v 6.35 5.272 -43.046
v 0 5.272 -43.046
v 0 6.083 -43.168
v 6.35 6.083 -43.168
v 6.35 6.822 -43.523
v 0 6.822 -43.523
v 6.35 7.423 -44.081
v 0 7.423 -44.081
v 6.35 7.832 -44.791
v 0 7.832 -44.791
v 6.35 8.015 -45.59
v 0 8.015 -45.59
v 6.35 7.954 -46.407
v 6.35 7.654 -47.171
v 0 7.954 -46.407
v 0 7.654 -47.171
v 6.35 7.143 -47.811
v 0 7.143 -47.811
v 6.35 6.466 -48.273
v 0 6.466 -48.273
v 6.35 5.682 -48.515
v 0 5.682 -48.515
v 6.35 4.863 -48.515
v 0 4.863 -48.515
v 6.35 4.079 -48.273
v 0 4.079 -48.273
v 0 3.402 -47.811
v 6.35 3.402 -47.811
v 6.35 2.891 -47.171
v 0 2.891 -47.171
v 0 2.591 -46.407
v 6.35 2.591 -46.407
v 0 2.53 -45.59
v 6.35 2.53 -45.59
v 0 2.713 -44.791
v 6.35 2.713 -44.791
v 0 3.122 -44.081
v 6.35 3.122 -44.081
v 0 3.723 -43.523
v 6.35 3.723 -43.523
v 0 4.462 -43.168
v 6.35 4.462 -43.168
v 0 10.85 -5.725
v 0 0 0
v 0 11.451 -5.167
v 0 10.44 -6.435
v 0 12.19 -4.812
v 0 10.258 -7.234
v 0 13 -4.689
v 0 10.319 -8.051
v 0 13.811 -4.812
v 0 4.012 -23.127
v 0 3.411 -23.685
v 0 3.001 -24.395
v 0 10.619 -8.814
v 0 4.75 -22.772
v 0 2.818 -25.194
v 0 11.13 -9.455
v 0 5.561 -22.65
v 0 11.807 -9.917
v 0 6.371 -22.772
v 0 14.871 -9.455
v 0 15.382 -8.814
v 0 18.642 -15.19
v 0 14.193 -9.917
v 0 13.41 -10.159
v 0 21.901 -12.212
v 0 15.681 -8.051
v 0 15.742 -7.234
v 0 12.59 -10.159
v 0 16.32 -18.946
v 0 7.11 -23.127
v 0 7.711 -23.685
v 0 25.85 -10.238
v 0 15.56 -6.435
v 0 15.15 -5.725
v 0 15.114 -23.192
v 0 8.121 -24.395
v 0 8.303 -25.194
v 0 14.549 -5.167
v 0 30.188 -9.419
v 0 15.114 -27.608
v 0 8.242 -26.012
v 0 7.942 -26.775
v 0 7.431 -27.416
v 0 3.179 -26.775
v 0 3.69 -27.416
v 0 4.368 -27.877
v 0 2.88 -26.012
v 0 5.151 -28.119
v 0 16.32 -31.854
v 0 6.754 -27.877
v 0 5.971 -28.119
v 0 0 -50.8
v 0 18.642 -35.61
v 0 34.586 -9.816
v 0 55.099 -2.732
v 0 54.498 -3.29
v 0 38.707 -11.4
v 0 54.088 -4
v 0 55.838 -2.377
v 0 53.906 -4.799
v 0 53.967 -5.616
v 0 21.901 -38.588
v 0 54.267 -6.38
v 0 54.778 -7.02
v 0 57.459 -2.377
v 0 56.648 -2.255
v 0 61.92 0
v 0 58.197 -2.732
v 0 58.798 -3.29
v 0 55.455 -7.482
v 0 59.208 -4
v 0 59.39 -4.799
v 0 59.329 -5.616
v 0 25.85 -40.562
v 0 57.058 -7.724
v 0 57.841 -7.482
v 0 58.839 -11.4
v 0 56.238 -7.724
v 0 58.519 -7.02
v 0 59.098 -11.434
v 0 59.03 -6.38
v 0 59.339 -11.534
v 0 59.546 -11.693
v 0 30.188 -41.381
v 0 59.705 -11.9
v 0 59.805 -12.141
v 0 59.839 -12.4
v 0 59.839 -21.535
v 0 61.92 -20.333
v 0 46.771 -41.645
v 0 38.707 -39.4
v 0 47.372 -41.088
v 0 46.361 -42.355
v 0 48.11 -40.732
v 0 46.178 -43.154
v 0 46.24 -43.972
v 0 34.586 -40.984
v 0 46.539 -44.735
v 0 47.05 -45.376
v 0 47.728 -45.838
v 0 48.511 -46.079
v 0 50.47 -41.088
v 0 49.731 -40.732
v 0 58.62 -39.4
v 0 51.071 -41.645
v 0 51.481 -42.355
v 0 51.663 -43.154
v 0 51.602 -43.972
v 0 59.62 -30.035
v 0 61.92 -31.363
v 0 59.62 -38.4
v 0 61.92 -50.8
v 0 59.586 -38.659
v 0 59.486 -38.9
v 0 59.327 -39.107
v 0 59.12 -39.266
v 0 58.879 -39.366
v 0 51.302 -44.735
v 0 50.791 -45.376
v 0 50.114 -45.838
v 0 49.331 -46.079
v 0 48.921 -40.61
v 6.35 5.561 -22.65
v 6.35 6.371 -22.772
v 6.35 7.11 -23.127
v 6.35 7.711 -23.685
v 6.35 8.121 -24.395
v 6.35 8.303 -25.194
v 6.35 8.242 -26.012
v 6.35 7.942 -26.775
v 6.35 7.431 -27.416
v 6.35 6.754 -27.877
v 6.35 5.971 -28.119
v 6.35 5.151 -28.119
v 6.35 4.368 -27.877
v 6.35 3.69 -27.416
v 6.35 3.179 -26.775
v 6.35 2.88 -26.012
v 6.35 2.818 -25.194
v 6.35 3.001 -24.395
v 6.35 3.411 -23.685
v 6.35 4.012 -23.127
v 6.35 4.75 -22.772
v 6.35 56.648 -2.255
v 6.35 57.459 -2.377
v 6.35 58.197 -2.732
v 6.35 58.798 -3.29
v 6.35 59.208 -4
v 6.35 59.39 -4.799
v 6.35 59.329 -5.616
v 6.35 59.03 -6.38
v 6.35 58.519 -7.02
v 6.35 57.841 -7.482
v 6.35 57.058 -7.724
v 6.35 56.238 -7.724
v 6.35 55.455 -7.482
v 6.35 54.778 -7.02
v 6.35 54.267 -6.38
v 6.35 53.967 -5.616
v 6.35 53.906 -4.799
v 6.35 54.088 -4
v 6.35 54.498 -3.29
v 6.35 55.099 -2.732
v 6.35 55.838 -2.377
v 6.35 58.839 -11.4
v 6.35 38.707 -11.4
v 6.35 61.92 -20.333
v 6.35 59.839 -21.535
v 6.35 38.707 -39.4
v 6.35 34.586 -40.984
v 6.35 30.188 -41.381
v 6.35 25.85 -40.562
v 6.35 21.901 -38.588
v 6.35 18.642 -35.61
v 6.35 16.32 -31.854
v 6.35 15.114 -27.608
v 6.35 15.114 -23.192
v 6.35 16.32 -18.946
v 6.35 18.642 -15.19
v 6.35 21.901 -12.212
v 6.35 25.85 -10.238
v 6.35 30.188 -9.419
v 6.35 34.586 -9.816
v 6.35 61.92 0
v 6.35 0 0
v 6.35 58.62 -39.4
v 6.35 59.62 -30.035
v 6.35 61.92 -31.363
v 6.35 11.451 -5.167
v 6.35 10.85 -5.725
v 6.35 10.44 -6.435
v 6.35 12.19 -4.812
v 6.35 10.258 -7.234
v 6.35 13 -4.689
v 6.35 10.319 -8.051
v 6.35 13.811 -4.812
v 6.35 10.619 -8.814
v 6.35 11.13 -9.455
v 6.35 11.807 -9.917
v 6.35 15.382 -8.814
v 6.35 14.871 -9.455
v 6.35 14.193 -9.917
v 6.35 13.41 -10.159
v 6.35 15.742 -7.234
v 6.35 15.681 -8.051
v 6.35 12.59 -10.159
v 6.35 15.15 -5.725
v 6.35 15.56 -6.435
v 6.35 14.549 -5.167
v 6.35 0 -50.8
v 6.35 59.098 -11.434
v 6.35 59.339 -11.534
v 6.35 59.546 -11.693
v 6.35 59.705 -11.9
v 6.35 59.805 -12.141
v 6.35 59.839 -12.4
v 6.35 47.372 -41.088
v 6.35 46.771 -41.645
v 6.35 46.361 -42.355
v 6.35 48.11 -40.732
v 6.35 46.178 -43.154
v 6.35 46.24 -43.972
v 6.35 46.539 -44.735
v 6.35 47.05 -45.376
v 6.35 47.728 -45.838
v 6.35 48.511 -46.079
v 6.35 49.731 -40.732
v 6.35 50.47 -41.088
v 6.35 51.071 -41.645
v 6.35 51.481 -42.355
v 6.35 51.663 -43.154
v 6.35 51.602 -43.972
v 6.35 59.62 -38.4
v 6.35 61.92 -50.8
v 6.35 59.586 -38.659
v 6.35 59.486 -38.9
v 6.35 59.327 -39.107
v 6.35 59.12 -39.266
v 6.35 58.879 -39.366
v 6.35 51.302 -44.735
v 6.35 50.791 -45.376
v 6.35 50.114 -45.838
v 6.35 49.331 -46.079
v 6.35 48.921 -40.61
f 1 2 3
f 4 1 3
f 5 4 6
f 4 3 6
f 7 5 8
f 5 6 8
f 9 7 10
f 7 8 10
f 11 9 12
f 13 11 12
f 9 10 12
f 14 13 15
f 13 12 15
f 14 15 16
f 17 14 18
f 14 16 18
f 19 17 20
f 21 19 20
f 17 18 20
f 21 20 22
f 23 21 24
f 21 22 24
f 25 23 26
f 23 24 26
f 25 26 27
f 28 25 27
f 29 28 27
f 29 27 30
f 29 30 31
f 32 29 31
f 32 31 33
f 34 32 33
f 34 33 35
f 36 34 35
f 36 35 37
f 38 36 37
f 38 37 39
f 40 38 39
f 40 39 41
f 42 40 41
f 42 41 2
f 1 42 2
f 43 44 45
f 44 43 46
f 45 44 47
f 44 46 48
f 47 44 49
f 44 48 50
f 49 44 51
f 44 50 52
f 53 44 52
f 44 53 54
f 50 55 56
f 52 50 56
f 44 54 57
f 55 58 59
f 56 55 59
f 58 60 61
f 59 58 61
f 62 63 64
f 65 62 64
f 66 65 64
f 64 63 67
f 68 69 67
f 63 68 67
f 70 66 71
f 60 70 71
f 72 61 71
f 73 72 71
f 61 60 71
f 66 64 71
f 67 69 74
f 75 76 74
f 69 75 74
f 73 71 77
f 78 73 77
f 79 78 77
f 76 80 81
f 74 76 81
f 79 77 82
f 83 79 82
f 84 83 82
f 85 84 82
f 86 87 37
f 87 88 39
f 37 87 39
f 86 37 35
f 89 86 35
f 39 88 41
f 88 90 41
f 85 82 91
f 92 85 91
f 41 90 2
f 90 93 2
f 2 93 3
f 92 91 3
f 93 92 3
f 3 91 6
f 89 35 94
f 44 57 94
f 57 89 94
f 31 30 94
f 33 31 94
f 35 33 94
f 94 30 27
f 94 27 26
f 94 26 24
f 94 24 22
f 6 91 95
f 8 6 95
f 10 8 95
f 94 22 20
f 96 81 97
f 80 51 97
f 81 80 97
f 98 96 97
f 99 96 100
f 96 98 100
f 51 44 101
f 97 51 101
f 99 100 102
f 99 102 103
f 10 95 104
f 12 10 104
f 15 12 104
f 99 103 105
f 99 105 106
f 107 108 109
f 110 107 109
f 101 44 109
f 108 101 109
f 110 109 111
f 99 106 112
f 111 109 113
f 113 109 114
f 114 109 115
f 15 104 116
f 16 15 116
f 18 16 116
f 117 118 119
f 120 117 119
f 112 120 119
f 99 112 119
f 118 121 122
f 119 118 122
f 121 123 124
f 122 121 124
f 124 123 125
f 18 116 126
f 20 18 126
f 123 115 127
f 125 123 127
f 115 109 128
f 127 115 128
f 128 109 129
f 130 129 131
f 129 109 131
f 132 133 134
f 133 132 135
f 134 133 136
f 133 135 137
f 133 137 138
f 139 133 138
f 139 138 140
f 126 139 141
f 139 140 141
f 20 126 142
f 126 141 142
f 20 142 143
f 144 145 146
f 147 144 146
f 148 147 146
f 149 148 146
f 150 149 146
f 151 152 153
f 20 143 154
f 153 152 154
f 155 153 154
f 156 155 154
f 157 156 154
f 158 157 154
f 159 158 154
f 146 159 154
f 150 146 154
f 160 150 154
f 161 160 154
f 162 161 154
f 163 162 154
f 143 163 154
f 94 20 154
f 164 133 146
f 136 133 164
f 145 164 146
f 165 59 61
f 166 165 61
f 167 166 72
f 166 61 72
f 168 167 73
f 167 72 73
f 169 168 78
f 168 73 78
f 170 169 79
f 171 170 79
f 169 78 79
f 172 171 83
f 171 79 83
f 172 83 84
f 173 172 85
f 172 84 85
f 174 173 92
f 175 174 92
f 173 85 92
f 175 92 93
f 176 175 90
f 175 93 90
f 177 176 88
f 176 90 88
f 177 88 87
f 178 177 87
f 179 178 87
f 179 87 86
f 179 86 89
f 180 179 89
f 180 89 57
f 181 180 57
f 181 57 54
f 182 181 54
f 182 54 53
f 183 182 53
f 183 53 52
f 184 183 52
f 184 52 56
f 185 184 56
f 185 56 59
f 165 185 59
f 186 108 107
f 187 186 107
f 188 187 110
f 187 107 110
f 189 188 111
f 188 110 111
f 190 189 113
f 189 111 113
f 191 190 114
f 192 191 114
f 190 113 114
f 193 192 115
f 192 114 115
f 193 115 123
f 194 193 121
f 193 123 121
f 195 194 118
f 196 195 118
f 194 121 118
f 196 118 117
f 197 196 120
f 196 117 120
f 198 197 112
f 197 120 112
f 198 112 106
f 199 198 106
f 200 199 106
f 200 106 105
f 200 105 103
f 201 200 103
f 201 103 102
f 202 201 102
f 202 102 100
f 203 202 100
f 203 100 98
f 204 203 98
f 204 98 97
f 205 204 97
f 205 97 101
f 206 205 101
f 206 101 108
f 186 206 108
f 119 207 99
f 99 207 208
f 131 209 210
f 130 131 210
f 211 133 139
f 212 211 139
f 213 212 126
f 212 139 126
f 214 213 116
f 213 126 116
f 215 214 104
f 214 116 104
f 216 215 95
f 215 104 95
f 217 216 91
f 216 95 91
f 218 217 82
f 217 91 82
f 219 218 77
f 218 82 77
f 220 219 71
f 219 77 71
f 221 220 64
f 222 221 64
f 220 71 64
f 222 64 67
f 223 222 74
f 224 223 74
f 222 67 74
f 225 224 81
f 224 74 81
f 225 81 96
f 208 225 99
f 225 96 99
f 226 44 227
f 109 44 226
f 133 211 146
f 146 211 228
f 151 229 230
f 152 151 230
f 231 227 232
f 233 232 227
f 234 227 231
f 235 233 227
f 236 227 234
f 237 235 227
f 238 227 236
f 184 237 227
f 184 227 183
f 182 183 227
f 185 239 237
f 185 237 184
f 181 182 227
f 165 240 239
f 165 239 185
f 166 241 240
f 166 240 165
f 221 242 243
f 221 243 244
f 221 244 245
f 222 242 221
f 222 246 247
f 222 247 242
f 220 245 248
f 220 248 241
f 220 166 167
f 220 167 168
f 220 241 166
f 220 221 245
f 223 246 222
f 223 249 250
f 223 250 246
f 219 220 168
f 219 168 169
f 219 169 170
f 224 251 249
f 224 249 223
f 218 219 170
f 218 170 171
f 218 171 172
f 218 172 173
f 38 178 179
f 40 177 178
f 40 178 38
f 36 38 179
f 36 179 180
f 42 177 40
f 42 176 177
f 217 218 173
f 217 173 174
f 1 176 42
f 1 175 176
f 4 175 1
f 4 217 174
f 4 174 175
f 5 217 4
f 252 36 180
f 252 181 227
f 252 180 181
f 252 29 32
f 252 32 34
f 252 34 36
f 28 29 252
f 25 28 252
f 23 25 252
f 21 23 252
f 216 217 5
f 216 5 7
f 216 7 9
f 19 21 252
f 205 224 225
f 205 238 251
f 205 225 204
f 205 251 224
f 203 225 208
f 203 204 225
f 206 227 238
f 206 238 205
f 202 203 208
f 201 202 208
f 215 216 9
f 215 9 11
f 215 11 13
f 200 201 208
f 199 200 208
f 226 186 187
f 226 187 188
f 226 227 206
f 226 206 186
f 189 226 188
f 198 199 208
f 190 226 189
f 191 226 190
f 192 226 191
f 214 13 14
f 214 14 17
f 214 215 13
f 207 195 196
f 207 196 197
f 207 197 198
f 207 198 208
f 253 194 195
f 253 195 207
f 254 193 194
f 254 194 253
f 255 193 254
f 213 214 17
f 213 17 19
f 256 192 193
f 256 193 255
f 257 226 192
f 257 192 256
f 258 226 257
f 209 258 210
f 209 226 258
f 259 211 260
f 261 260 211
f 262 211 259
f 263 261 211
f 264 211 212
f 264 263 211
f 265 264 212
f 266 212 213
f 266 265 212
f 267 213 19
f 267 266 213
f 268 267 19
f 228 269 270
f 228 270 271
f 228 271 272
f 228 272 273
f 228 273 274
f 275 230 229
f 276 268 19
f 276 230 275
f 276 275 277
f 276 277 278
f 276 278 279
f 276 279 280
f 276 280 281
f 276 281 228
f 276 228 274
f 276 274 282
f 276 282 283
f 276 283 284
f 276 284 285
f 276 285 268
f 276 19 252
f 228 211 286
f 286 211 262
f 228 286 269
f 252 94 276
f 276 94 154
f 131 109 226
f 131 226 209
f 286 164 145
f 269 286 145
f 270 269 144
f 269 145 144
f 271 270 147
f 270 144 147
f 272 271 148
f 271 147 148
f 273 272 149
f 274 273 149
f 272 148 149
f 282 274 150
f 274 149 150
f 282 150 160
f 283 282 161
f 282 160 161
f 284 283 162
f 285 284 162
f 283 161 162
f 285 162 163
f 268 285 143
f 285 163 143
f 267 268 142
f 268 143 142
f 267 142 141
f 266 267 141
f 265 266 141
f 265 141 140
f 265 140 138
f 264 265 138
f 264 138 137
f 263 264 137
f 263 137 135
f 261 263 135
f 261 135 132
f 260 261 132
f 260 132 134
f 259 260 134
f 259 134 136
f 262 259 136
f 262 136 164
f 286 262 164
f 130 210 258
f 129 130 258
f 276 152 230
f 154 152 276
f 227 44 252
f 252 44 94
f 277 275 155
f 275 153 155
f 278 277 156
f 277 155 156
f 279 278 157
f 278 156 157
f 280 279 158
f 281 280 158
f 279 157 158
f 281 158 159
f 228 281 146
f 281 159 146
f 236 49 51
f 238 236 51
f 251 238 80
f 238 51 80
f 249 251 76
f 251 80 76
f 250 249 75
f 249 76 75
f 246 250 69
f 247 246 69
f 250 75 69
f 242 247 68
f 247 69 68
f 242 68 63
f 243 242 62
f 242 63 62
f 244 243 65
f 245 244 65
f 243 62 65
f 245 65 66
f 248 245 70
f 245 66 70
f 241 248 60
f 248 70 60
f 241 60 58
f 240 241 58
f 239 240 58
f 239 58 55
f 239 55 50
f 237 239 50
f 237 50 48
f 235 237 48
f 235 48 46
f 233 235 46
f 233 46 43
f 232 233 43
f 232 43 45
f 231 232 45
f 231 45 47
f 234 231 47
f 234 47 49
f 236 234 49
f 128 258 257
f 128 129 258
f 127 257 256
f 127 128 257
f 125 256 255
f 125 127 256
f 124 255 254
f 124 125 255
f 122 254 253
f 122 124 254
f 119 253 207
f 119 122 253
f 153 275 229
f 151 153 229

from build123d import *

# Parameters (mm, degrees)
SKETCH1_W           = 50.8
SKETCH1_H           = 61.92
BOSS_EXTRUDE2_DEPTH = 6.35
SKETCH2_R           = 16
CUT_EXTRUDE1_DEPTH  = 7.35
CUT_EXTRUDE4_DEPTH  = 7.35
CUT_EXTRUDE5_REACH  = 8.35
SKETCH5_R           = 2.75
FILLET1_R           = 1


with BuildPart() as part:
    # Sketch1 → Boss-Extrude2 (new body)
    with BuildSketch(Plane(origin=(0, 0, 0), x_dir=(0, 0, -1), z_dir=(1, 0, 0))):
        with Locations((25.4, 30.96)):
            Rectangle(SKETCH1_W, SKETCH1_H)
    extrude(amount=BOSS_EXTRUDE2_DEPTH)

    # Sketch2 → Cut-Extrude1 (cut, through all)
    with BuildSketch(Plane.ZY):
        with Locations((-25.4, 30.960695)):
            Circle(SKETCH2_R)
    extrude(amount=-CUT_EXTRUDE1_DEPTH, mode=Mode.SUBTRACT)

    # Sketch4 → Cut-Extrude4 (cut, through all)
    with BuildSketch(Plane(origin=(6.35, 0, 0), x_dir=(0, 0, -1), z_dir=(1, 0, 0))):
        Polygon((11.4, 59.839253392), (11.4, 37.92), (39.4, 37.92), (39.4, 59.62), (30.034684812, 59.62), (33.389978254, 65.431538715), (18.305977376, 65.431538715), (21.534684812, 59.839253392), align=None)
    extrude(amount=-CUT_EXTRUDE4_DEPTH, mode=Mode.SUBTRACT)

    # Sketch5 → Cut-Extrude5 (cut, up to next)
    with BuildSketch(Plane.ZY, mode=Mode.PRIVATE) as cut_extrude5_sk1:
        with Locations((-45.795509398, 5.272471121)):
            Circle(SKETCH5_R)
    cut_extrude5_tool1 = extrude(cut_extrude5_sk1.sketch, amount=-CUT_EXTRUDE5_REACH, mode=Mode.PRIVATE) & part.part
    add(cut_extrude5_tool1.solids().sort_by_distance((0, 5.272471, -45.795509))[0], mode=Mode.SUBTRACT)
    # Sketch5 → Cut-Extrude5 (cut, up to next)
    with BuildSketch(Plane.ZY, mode=Mode.PRIVATE) as cut_extrude5_sk2:
        with Locations((-25.399655405, 5.560695)):
            Circle(SKETCH5_R)
    cut_extrude5_tool2 = extrude(cut_extrude5_sk2.sketch, amount=-CUT_EXTRUDE5_REACH, mode=Mode.PRIVATE) & part.part
    add(cut_extrude5_tool2.solids().sort_by_distance((0, 5.560695, -25.399655))[0], mode=Mode.SUBTRACT)
    # Sketch5 → Cut-Extrude5 (cut, up to next)
    with BuildSketch(Plane.ZY, mode=Mode.PRIVATE) as cut_extrude5_sk3:
        with Locations((-7.439487758, 13.000182758)):
            Circle(SKETCH5_R)
    cut_extrude5_tool3 = extrude(cut_extrude5_sk3.sketch, amount=-CUT_EXTRUDE5_REACH, mode=Mode.PRIVATE) & part.part
    add(cut_extrude5_tool3.solids().sort_by_distance((0, 13.000183, -7.439488))[0], mode=Mode.SUBTRACT)
    # Sketch5 → Cut-Extrude5 (cut, up to next)
    with BuildSketch(Plane.ZY, mode=Mode.PRIVATE) as cut_extrude5_sk4:
        with Locations((-43.35992398, 48.920755906)):
            Circle(SKETCH5_R)
    cut_extrude5_tool4 = extrude(cut_extrude5_sk4.sketch, amount=-CUT_EXTRUDE5_REACH, mode=Mode.PRIVATE) & part.part
    add(cut_extrude5_tool4.solids().sort_by_distance((0, 48.920756, -43.359924))[0], mode=Mode.SUBTRACT)
    # Sketch5 → Cut-Extrude5 (cut, up to next)
    with BuildSketch(Plane.ZY, mode=Mode.PRIVATE) as cut_extrude5_sk5:
        with Locations((-5.004504526, 56.648087135)):
            Circle(SKETCH5_R)
    cut_extrude5_tool5 = extrude(cut_extrude5_sk5.sketch, amount=-CUT_EXTRUDE5_REACH, mode=Mode.PRIVATE) & part.part
    add(cut_extrude5_tool5.solids().sort_by_distance((0, 56.648087, -5.004505))[0], mode=Mode.SUBTRACT)

    # Fillet1
    fillet1_edges = [part.edges().sort_by_distance(p)[0] for p in [
        (3.175, 59.62, -39.4),
        (3.175, 59.839253392, -11.4),
    ]]
    fillet(fillet1_edges, radius=FILLET1_R)


solid = part.part
